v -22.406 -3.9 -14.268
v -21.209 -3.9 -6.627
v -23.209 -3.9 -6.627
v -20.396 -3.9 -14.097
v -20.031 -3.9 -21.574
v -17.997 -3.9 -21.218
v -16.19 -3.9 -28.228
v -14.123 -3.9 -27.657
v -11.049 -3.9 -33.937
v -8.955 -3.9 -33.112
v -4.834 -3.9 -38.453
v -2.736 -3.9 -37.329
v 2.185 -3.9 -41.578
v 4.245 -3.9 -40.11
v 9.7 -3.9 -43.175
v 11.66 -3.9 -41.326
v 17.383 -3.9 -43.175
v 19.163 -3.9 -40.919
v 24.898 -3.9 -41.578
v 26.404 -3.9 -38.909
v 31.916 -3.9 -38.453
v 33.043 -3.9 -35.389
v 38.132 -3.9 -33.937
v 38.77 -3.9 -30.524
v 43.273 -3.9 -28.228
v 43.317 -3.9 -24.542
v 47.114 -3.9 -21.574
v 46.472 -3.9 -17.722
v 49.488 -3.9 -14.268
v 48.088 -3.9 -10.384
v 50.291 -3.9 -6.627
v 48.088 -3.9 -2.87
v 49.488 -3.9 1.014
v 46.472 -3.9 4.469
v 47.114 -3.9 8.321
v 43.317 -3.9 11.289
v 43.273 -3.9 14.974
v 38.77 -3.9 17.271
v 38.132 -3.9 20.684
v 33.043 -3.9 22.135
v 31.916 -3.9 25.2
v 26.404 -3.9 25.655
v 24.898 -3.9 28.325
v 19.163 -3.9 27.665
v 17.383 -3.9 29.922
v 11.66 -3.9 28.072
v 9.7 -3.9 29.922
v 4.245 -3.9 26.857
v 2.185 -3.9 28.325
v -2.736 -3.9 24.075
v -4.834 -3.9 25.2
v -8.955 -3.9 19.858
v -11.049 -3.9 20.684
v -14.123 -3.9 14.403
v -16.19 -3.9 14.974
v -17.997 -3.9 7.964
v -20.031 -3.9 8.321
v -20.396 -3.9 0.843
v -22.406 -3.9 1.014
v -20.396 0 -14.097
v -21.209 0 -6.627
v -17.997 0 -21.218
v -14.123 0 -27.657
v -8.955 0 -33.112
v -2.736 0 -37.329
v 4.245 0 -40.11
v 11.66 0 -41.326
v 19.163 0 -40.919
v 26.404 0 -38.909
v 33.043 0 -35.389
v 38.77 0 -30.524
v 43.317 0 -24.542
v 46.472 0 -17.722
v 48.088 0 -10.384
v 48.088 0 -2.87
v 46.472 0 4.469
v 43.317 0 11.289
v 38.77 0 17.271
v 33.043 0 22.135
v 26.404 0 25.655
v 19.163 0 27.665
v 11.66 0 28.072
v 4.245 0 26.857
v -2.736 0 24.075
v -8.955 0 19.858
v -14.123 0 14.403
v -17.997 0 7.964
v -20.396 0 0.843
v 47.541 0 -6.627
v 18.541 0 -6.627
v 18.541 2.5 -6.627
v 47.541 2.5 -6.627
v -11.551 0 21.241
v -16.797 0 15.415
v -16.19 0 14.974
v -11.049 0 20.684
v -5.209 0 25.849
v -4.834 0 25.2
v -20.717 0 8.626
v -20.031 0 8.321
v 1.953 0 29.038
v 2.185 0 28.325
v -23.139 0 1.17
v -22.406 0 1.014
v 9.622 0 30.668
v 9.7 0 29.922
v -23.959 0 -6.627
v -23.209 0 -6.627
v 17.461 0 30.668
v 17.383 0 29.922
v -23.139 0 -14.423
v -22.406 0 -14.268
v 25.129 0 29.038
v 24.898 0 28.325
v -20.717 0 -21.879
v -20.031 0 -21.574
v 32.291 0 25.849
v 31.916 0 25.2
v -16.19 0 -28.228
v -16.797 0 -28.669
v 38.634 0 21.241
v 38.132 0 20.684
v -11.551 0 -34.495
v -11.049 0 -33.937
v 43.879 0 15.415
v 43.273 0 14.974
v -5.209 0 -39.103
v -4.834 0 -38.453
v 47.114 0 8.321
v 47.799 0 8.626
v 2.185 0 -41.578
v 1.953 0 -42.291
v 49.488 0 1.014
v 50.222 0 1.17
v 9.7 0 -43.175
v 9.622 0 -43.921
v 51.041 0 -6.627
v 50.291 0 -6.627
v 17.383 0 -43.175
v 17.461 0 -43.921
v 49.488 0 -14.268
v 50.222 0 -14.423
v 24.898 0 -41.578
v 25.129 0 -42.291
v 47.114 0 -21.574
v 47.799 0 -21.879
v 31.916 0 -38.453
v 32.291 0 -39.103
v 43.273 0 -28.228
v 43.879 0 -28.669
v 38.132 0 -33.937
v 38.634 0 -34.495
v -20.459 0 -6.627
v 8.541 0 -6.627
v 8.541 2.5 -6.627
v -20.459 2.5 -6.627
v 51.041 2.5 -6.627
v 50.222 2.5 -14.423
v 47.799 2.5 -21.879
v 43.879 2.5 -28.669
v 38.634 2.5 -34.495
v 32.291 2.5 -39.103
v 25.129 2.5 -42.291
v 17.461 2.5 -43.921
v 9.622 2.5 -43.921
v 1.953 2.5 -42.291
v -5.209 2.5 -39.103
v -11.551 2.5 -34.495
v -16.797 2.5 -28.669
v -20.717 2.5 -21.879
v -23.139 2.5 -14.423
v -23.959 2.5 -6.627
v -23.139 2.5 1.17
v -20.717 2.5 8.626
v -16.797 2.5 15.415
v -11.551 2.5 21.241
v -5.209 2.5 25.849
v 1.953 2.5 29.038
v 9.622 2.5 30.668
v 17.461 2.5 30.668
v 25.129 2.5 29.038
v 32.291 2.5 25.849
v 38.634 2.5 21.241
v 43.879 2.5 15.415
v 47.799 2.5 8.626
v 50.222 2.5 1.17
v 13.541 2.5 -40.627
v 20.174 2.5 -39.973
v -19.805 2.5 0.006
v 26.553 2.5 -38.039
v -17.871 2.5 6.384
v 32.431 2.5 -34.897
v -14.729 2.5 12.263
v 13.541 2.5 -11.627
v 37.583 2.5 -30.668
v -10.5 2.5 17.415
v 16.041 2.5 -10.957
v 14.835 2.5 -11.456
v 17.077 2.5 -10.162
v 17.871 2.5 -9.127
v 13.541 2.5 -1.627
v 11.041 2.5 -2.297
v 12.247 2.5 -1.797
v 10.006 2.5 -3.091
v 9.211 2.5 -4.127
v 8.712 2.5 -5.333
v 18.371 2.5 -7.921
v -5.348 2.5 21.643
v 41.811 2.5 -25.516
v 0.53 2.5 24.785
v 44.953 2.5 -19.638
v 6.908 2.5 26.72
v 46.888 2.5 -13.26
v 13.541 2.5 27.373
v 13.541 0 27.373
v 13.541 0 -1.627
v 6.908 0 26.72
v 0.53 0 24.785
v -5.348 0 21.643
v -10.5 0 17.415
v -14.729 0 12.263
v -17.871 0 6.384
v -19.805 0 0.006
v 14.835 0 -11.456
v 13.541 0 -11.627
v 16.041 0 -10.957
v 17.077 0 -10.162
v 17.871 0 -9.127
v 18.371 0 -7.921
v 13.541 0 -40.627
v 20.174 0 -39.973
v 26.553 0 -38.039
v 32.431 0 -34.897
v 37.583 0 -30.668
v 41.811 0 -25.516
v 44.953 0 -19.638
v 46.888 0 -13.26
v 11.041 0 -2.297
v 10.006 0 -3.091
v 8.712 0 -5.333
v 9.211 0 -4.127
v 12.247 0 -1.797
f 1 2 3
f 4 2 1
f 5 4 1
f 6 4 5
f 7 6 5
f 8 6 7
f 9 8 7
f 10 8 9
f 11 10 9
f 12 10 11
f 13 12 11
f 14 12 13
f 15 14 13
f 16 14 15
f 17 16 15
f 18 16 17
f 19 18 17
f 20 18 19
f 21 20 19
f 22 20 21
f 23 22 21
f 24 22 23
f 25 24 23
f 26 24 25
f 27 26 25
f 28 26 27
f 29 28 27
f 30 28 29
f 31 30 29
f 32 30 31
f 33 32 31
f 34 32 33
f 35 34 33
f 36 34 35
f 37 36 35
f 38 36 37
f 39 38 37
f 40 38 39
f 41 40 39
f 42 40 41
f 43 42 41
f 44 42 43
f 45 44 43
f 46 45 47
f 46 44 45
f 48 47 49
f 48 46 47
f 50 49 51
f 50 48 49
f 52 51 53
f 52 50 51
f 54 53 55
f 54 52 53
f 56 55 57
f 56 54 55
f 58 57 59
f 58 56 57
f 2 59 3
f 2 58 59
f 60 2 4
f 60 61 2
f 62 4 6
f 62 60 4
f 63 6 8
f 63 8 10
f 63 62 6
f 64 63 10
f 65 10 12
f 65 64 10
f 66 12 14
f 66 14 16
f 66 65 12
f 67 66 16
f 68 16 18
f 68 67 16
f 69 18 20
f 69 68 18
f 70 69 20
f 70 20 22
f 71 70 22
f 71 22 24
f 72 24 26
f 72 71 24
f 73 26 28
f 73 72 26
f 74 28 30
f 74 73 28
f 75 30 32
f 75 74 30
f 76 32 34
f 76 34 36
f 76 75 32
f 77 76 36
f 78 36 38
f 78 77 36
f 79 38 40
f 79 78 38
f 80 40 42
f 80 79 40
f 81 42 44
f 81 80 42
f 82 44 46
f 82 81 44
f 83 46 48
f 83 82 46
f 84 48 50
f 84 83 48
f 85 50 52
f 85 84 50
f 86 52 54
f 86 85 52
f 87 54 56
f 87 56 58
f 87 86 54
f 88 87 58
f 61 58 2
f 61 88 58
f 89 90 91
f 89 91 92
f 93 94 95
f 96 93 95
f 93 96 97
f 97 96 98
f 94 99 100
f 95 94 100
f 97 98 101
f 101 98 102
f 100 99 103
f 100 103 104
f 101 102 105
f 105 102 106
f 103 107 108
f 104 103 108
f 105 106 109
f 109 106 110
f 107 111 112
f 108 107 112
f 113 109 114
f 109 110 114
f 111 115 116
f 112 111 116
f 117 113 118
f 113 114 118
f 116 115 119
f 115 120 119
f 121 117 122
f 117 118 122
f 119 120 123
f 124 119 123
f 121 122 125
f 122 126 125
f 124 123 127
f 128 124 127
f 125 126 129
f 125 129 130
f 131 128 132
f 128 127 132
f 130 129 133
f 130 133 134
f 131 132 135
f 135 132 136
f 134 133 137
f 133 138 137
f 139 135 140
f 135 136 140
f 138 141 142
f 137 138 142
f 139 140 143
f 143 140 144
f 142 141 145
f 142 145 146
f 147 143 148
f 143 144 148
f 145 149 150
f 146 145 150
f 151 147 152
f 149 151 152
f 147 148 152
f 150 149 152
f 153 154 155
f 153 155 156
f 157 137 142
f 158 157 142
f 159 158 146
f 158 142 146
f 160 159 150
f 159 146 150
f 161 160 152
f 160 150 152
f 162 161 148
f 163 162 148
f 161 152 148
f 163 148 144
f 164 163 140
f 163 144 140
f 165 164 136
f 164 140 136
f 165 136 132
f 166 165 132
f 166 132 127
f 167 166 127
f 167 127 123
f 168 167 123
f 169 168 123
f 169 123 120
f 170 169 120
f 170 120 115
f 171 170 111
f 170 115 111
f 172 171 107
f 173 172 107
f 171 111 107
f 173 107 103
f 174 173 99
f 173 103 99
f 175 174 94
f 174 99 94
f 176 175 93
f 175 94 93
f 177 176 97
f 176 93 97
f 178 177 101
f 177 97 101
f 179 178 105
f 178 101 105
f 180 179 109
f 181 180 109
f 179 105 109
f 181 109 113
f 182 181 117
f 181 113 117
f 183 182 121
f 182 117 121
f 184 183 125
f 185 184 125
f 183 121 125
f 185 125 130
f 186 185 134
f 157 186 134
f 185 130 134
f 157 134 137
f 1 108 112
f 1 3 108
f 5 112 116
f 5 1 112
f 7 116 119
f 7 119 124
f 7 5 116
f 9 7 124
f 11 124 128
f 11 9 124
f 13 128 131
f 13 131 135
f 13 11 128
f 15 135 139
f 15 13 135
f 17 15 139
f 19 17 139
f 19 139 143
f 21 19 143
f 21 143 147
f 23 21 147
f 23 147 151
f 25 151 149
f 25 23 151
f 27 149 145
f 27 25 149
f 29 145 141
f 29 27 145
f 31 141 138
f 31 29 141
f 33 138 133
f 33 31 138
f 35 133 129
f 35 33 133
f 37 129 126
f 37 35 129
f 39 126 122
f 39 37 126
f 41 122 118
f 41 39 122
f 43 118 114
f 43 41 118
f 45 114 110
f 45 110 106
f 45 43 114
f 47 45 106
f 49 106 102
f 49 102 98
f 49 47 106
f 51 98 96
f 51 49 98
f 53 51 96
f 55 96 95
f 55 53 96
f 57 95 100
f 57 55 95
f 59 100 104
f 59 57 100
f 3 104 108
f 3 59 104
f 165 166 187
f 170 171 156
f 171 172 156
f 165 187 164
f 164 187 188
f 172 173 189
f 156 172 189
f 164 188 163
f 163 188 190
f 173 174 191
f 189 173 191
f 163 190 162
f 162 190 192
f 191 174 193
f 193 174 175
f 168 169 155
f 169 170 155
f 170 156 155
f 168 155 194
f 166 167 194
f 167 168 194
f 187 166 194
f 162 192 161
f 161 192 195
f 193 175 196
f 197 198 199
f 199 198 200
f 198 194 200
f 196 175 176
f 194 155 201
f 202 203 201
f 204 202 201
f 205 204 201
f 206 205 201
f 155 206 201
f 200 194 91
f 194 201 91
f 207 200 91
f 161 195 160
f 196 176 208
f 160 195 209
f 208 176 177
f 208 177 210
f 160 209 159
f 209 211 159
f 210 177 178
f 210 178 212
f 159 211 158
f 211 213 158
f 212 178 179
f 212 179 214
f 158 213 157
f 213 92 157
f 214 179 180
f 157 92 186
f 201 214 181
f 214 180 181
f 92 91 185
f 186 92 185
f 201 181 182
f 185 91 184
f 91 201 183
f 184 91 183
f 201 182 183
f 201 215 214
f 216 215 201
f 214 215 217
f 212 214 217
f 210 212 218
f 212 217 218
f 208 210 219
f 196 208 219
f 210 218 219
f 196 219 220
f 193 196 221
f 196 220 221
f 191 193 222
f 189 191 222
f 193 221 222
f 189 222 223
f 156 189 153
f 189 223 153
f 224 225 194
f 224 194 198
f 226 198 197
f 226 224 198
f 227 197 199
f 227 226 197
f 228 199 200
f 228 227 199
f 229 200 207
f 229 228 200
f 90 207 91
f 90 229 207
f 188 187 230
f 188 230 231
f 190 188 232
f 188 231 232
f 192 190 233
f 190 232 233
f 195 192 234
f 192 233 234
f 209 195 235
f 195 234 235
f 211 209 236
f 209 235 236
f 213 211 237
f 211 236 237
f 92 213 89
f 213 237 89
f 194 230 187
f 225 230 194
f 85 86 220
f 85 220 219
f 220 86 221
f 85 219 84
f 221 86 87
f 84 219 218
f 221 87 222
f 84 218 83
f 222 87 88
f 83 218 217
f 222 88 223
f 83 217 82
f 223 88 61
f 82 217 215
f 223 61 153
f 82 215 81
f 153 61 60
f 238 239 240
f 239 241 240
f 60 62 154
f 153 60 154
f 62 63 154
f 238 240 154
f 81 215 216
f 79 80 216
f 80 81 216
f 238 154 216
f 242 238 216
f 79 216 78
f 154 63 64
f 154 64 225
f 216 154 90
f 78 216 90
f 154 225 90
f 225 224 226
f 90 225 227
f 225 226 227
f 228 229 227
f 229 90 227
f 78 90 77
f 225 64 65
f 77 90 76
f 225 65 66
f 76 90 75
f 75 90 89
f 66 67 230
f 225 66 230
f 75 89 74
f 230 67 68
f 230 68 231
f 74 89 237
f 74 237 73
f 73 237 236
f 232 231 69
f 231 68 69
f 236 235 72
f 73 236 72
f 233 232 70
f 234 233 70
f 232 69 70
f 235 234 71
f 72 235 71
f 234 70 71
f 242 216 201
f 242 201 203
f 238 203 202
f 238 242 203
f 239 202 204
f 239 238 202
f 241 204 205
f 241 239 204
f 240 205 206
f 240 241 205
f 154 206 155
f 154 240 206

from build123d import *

# Parameters (mm, degrees)
CROQUIS1_R              = 37.5
SALIENTE_EXTRUIR1_DEPTH = 2.5
CROQUIS3_W              = 2
CROQUIS3_H              = 4
CROQUIS5_R              = 35
CROQUIS5_R_2            = 34
SALIENTE_EXTRUIR2_DEPTH = 2.5


with BuildPart() as part:
    # Croquis1 → Saliente-Extruir1 (new body)
    with BuildSketch(Plane(origin=(0, 0, 0), x_dir=(1, 0, 0), z_dir=(0, 1, 0))):
        with Locations((13.541348433, 6.626768313)):
            Circle(CROQUIS1_R)
        with BuildLine():
            Line((13.541348433, 41.626768313), (13.541348433, 11.626768313))
            ThreePointArc((13.541348433, 11.626768313), (17.076882339, 10.162302219), (18.541348433, 6.626768313))
            Line((18.541348433, 6.626768313), (48.541348433, 6.626768313))
            ThreePointArc((48.541348433, 6.626768313), (38.290085775, 31.375505654), (13.541348433, 41.626768313))
        make_face(mode=Mode.SUBTRACT)
        with BuildLine():
            Line((8.541348433, 6.626768313), (-21.458651567, 6.626768313))
            ThreePointArc((-21.458651567, 6.626768313), (-11.207388908, -18.121969029), (13.541348433, -28.373231687))
            Line((13.541348433, -28.373231687), (13.541348433, 1.626768313))
            ThreePointArc((13.541348433, 1.626768313), (10.005814527, 3.091234407), (8.541348433, 6.626768313))
        make_face(mode=Mode.SUBTRACT)
    extrude(amount=SALIENTE_EXTRUIR1_DEPTH)

    # Barrer1: sweep along a path in Croquis4
    with BuildLine(Plane(origin=(0, 0, 0), x_dir=(-1, 0, 0), z_dir=(0, -1, 0))) as barrer1_path:
        CenterArc((-13.541348433, 6.626768313), 36.25, 0, 360)
    # Croquis3 → Barrer1 (sweep)
    with BuildSketch(Plane.XY.offset(-6.626768313)):
        with Locations((-22.208651567, -1.9)):
            Rectangle(CROQUIS3_W, CROQUIS3_H)
    sweep(path=barrer1_path.line)

    # Croquis5 → Saliente-Extruir2 (add)
    with BuildSketch(Plane.XZ):
        with Locations((13.541348433, -6.626768313)):
            Circle(CROQUIS5_R)
        with Locations((13.541348433, -6.626768313)):
            Circle(CROQUIS5_R_2, mode=Mode.SUBTRACT)
    extrude(amount=-SALIENTE_EXTRUIR2_DEPTH)


solid = part.part
